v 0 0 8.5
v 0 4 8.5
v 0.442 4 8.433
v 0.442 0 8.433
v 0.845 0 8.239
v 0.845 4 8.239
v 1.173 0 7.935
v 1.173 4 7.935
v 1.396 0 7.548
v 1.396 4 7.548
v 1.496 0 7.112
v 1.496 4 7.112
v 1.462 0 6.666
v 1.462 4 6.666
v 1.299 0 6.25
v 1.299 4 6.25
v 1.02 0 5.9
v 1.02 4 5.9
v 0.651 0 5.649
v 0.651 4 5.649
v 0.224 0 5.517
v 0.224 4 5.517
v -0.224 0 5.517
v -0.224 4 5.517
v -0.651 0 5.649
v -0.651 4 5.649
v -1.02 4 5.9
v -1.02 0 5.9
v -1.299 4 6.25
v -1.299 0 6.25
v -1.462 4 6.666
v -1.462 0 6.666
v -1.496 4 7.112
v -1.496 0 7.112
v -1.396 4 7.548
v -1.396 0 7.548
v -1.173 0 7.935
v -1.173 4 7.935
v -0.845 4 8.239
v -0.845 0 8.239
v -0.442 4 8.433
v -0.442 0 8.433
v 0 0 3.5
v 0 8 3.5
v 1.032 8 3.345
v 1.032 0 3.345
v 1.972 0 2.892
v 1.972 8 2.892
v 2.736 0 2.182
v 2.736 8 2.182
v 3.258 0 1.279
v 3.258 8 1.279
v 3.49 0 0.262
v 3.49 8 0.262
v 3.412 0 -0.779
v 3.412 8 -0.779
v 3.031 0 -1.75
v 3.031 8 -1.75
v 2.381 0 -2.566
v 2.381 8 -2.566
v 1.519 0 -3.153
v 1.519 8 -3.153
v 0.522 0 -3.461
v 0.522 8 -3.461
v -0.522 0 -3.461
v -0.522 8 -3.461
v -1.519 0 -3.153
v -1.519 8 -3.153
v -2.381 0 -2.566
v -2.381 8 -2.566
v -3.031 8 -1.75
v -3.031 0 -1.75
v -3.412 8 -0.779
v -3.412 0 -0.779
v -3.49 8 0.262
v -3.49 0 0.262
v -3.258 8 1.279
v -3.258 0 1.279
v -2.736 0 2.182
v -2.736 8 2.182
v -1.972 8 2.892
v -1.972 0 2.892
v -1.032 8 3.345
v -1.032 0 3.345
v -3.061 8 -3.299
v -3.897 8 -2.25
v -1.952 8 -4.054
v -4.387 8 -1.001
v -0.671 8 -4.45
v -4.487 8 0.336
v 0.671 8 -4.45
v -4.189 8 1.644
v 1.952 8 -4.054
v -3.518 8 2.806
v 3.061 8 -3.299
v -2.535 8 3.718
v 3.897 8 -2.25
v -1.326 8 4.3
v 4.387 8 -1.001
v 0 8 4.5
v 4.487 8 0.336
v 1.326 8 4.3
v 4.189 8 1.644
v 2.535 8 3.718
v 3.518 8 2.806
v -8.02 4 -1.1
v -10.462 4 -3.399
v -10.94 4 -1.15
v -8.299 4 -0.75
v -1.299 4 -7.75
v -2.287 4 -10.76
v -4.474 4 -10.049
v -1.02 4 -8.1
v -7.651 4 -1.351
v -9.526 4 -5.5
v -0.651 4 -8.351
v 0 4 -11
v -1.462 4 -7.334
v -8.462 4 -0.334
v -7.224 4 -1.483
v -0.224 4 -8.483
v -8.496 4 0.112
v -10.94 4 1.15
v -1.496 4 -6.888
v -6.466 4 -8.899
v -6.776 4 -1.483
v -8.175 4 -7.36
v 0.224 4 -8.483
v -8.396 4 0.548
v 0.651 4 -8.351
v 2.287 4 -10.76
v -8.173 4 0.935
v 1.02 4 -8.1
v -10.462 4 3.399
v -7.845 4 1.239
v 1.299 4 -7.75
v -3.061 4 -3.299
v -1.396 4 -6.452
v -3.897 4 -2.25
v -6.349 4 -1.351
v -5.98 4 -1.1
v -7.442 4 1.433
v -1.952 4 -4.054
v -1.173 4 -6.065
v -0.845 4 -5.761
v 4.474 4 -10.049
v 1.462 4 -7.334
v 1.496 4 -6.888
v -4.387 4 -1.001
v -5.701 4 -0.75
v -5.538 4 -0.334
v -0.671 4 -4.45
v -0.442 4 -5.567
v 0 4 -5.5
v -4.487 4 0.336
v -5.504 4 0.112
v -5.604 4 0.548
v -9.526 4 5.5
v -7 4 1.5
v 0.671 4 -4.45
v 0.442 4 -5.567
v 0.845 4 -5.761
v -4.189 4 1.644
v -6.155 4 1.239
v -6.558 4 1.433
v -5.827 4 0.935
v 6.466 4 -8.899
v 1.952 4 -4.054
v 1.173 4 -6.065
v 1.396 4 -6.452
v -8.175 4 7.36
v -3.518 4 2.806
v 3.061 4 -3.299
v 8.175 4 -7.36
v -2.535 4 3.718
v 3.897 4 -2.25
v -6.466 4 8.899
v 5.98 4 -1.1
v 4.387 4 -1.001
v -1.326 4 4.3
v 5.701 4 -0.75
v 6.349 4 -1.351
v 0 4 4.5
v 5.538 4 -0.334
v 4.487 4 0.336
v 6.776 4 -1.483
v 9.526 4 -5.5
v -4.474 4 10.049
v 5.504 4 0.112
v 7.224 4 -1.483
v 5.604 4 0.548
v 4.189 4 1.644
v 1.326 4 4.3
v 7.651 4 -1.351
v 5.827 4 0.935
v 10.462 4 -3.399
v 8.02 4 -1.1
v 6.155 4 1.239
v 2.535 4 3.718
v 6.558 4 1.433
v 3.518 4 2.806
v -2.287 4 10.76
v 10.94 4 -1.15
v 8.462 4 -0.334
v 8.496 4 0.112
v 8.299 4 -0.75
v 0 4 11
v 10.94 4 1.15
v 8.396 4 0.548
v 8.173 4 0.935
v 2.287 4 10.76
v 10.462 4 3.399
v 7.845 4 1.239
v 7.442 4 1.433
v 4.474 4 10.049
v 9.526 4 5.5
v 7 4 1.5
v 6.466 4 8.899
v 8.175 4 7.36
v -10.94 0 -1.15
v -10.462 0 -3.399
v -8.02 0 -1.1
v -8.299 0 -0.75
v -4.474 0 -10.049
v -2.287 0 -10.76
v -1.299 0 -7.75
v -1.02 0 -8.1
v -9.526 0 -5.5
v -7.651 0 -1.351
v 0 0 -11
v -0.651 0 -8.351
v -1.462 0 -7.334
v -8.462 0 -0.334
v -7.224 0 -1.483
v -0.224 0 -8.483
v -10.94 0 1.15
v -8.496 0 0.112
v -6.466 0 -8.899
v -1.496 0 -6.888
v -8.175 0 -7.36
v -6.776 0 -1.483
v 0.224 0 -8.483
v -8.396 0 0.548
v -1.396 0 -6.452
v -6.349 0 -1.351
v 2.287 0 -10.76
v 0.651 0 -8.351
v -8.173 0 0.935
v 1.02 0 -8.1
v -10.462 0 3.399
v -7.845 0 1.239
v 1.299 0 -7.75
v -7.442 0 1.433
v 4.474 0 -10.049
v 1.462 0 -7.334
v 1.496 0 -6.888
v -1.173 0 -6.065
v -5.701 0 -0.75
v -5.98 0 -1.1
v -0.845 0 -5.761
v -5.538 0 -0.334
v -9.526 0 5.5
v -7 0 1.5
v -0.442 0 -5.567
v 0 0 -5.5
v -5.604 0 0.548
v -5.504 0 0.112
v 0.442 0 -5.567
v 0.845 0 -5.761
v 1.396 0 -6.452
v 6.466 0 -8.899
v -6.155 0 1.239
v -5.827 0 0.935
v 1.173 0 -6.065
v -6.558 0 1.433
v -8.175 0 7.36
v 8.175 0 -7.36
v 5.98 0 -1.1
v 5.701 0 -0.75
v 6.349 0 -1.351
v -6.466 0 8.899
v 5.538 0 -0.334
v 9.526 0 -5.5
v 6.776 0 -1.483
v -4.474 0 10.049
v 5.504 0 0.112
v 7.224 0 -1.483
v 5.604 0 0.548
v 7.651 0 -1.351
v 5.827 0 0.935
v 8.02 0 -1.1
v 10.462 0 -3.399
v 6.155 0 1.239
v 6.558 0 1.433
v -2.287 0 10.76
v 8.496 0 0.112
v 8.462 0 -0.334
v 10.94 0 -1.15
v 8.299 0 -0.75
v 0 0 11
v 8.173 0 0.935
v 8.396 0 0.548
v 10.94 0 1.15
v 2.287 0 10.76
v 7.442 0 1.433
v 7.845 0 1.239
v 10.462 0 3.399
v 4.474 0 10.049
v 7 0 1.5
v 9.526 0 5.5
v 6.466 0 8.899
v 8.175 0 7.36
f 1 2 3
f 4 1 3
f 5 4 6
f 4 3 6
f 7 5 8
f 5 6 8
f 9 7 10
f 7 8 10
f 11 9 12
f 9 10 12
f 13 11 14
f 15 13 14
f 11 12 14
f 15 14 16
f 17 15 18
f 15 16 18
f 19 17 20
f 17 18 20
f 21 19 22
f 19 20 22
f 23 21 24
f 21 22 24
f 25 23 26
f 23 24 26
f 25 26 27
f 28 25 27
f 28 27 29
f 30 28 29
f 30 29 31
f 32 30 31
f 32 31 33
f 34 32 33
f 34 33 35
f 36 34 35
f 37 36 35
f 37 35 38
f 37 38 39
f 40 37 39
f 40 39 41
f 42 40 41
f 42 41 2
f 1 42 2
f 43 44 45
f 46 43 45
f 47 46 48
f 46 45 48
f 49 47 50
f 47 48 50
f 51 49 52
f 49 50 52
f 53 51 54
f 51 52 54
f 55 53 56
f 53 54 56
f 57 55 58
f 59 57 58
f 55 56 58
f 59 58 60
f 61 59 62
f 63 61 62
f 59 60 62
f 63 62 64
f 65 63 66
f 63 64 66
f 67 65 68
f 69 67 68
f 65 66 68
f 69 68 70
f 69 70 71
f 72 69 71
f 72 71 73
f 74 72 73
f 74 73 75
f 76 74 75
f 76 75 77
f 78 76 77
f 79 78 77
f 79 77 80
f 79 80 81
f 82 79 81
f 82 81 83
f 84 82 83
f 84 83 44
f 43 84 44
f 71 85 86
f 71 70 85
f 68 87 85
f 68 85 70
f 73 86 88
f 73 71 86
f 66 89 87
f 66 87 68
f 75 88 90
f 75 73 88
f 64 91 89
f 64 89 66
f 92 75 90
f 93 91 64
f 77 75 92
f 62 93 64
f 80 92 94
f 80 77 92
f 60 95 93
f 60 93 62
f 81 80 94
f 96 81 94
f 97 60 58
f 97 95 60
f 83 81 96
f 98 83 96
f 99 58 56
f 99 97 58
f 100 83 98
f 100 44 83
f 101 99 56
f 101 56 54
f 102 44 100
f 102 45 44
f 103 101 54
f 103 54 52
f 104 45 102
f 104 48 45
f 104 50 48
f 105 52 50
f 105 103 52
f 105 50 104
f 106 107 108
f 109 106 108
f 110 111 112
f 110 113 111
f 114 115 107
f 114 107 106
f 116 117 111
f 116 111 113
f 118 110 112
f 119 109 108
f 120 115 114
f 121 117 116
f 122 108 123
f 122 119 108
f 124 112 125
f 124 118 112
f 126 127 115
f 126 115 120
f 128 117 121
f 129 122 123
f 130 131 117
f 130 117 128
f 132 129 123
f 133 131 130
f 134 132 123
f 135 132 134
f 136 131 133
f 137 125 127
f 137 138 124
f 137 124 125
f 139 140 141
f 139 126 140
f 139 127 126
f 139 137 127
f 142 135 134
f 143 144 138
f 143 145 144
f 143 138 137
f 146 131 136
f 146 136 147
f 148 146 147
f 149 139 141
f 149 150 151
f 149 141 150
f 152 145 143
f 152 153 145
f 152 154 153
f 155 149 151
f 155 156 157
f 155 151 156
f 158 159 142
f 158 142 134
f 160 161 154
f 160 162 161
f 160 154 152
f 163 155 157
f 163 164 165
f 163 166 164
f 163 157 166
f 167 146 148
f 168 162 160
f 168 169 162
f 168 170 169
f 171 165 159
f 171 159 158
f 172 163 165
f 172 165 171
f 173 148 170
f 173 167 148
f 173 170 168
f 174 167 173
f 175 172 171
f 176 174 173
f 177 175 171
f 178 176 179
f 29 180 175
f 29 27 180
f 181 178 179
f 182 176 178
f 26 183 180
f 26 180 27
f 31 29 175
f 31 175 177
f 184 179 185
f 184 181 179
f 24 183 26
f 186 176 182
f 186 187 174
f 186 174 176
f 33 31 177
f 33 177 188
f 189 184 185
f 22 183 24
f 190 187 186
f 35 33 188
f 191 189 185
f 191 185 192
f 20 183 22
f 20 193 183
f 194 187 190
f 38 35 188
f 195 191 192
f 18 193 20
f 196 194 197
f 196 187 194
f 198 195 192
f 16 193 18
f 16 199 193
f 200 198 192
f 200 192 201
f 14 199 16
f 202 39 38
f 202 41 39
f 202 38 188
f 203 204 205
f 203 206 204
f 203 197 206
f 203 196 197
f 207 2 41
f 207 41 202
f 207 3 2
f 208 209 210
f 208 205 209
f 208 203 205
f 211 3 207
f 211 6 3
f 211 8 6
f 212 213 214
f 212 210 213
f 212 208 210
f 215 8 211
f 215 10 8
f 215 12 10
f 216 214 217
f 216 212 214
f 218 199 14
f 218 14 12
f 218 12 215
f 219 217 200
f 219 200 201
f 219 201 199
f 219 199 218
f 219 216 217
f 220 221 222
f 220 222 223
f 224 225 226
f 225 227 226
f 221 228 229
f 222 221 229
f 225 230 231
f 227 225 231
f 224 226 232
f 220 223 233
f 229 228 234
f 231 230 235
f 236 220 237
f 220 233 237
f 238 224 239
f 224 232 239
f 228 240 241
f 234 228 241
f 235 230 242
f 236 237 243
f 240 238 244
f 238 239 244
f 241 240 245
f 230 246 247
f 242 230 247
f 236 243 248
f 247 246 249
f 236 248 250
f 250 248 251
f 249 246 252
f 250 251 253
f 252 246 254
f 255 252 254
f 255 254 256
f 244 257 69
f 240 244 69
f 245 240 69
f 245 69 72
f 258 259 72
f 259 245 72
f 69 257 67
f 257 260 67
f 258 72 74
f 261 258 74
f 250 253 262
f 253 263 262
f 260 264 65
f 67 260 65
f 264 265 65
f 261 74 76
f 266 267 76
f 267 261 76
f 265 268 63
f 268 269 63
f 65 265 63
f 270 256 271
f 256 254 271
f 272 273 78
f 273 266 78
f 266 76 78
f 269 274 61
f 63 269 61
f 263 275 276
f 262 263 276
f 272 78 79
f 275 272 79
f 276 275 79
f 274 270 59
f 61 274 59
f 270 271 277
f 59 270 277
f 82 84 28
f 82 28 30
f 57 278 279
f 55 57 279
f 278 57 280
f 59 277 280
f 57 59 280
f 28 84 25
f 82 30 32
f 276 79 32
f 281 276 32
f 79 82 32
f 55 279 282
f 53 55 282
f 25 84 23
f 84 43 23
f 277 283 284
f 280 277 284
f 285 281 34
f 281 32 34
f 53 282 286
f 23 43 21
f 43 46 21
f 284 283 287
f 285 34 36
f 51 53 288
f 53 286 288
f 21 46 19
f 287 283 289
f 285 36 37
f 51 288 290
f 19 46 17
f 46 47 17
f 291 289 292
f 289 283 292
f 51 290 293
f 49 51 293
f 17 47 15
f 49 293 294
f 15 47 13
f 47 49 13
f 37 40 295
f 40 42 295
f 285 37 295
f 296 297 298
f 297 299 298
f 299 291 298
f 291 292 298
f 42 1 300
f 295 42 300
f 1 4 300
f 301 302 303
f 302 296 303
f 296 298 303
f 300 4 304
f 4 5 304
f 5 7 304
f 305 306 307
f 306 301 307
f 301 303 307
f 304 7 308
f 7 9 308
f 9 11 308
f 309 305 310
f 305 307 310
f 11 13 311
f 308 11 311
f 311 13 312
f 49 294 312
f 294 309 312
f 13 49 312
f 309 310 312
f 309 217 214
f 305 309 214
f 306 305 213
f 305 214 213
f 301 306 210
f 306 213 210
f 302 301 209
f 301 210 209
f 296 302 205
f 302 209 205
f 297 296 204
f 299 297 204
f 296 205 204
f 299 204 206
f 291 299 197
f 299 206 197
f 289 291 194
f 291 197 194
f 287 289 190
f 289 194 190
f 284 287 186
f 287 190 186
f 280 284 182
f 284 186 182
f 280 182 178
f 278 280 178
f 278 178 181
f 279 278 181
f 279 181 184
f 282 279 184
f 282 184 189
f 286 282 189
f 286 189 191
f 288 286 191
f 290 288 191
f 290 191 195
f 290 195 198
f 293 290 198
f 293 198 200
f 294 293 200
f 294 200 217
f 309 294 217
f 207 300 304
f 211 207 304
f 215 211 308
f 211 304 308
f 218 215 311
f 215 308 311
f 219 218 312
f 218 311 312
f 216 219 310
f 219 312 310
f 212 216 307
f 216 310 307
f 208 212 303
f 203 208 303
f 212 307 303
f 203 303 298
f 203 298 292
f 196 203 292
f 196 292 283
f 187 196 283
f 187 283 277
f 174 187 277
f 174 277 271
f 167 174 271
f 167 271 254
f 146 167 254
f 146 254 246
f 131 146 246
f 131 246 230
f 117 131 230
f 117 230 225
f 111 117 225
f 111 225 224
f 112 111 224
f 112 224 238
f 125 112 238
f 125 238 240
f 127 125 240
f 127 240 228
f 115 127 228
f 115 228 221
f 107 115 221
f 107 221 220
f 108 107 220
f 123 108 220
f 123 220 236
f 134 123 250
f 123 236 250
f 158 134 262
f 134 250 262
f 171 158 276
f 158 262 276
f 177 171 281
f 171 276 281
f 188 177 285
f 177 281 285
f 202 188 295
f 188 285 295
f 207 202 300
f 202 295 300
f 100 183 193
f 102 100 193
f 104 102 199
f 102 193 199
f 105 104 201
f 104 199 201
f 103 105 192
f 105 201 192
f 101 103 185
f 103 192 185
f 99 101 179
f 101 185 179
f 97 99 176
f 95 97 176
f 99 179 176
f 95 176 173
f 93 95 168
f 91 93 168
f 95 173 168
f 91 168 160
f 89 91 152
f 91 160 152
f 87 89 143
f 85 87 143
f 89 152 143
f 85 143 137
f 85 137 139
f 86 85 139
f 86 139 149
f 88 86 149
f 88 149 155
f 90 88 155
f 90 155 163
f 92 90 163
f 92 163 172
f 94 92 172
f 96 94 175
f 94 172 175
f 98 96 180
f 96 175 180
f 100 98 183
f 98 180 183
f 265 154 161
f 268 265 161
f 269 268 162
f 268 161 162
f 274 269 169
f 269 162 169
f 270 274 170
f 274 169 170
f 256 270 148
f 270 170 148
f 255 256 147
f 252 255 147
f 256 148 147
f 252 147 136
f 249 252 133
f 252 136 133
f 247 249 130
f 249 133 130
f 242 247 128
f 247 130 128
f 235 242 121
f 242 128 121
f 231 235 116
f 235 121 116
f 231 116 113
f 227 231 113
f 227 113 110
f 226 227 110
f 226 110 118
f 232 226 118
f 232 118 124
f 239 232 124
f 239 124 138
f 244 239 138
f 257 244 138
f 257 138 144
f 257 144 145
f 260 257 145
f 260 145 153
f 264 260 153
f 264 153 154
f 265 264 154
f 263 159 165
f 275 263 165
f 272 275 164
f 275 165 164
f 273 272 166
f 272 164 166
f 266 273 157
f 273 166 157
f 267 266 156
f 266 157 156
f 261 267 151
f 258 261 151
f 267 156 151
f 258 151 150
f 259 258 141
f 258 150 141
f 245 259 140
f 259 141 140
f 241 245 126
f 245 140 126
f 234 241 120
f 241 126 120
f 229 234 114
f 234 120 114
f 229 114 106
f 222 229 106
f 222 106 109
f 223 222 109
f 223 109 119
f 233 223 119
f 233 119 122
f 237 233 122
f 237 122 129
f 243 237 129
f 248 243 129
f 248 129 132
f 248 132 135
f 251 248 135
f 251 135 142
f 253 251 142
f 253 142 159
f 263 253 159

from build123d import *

# Parameters (mm, degrees)
SKETCH1_R           = 11
BOSS_EXTRUDE2_DEPTH = 8
SKETCH3_R           = 3
SKETCH3_R_2         = 1.5
CUT_EXTRUDE2_DEPTH  = 12
CUT_EXTRUDE3_START  = -4
SKETCH4_R           = 11
SKETCH4_R_2         = 4.5
CUT_EXTRUDE3_DEPTH  = 4
SKETCH6_R           = 3.5
CUT_EXTRUDE4_DEPTH  = 10


with BuildPart() as part:
    # Sketch1 → Boss-Extrude2 (new body)
    with BuildSketch(Plane(origin=(0, 0, 0), x_dir=(1, 0, 0), z_dir=(0, 1, 0))):
        with Locations(Location((0, 0, 0), (0, 0, 270))):
            Circle(SKETCH1_R)
    extrude(amount=BOSS_EXTRUDE2_DEPTH)

    # Sketch3 → Cut-Extrude2 (cut)
    with BuildSketch(Plane(origin=(0, 8, 0), x_dir=(1, 0, 0), z_dir=(0, 1, 0))):
        with Locations(Location((0, 0, 0), (0, 0, 270))):
            Circle(SKETCH3_R)
        with Locations(Location((-7, 0, 0), (0, 0, 270))):
            Circle(SKETCH3_R_2)
        with Locations(Location((0, 7, 0), (0, 0, 270))):
            Circle(SKETCH3_R_2)
        with Locations(Location((7, 0, 0), (0, 0, 270))):
            Circle(SKETCH3_R_2)
        with Locations(Location((0, -7, 0), (0, 0, 270))):
            Circle(SKETCH3_R_2)
    extrude(amount=-CUT_EXTRUDE2_DEPTH, mode=Mode.SUBTRACT)

    # Sketch4 → Cut-Extrude3 (cut)
    with BuildSketch(Plane(origin=(0, 8, 0), x_dir=(1, 0, 0), z_dir=(0, 1, 0)).offset(CUT_EXTRUDE3_START)):
        with Locations(Location((0, 0, 0), (0, 0, 270))):
            Circle(SKETCH4_R)
        with Locations(Location((0, 0, 0), (0, 0, 270))):
            Circle(SKETCH4_R_2, mode=Mode.SUBTRACT)
    extrude(amount=CUT_EXTRUDE3_DEPTH, mode=Mode.SUBTRACT)

    # Sketch6 → Cut-Extrude4 (cut)
    with BuildSketch(Plane(origin=(0, 8, 0), x_dir=(1, 0, 0), z_dir=(0, 1, 0))):
        with Locations(Location((0, 0, 0), (0, 0, 270))):
            Circle(SKETCH6_R)
    extrude(amount=-CUT_EXTRUDE4_DEPTH, mode=Mode.SUBTRACT)


solid = part.part
